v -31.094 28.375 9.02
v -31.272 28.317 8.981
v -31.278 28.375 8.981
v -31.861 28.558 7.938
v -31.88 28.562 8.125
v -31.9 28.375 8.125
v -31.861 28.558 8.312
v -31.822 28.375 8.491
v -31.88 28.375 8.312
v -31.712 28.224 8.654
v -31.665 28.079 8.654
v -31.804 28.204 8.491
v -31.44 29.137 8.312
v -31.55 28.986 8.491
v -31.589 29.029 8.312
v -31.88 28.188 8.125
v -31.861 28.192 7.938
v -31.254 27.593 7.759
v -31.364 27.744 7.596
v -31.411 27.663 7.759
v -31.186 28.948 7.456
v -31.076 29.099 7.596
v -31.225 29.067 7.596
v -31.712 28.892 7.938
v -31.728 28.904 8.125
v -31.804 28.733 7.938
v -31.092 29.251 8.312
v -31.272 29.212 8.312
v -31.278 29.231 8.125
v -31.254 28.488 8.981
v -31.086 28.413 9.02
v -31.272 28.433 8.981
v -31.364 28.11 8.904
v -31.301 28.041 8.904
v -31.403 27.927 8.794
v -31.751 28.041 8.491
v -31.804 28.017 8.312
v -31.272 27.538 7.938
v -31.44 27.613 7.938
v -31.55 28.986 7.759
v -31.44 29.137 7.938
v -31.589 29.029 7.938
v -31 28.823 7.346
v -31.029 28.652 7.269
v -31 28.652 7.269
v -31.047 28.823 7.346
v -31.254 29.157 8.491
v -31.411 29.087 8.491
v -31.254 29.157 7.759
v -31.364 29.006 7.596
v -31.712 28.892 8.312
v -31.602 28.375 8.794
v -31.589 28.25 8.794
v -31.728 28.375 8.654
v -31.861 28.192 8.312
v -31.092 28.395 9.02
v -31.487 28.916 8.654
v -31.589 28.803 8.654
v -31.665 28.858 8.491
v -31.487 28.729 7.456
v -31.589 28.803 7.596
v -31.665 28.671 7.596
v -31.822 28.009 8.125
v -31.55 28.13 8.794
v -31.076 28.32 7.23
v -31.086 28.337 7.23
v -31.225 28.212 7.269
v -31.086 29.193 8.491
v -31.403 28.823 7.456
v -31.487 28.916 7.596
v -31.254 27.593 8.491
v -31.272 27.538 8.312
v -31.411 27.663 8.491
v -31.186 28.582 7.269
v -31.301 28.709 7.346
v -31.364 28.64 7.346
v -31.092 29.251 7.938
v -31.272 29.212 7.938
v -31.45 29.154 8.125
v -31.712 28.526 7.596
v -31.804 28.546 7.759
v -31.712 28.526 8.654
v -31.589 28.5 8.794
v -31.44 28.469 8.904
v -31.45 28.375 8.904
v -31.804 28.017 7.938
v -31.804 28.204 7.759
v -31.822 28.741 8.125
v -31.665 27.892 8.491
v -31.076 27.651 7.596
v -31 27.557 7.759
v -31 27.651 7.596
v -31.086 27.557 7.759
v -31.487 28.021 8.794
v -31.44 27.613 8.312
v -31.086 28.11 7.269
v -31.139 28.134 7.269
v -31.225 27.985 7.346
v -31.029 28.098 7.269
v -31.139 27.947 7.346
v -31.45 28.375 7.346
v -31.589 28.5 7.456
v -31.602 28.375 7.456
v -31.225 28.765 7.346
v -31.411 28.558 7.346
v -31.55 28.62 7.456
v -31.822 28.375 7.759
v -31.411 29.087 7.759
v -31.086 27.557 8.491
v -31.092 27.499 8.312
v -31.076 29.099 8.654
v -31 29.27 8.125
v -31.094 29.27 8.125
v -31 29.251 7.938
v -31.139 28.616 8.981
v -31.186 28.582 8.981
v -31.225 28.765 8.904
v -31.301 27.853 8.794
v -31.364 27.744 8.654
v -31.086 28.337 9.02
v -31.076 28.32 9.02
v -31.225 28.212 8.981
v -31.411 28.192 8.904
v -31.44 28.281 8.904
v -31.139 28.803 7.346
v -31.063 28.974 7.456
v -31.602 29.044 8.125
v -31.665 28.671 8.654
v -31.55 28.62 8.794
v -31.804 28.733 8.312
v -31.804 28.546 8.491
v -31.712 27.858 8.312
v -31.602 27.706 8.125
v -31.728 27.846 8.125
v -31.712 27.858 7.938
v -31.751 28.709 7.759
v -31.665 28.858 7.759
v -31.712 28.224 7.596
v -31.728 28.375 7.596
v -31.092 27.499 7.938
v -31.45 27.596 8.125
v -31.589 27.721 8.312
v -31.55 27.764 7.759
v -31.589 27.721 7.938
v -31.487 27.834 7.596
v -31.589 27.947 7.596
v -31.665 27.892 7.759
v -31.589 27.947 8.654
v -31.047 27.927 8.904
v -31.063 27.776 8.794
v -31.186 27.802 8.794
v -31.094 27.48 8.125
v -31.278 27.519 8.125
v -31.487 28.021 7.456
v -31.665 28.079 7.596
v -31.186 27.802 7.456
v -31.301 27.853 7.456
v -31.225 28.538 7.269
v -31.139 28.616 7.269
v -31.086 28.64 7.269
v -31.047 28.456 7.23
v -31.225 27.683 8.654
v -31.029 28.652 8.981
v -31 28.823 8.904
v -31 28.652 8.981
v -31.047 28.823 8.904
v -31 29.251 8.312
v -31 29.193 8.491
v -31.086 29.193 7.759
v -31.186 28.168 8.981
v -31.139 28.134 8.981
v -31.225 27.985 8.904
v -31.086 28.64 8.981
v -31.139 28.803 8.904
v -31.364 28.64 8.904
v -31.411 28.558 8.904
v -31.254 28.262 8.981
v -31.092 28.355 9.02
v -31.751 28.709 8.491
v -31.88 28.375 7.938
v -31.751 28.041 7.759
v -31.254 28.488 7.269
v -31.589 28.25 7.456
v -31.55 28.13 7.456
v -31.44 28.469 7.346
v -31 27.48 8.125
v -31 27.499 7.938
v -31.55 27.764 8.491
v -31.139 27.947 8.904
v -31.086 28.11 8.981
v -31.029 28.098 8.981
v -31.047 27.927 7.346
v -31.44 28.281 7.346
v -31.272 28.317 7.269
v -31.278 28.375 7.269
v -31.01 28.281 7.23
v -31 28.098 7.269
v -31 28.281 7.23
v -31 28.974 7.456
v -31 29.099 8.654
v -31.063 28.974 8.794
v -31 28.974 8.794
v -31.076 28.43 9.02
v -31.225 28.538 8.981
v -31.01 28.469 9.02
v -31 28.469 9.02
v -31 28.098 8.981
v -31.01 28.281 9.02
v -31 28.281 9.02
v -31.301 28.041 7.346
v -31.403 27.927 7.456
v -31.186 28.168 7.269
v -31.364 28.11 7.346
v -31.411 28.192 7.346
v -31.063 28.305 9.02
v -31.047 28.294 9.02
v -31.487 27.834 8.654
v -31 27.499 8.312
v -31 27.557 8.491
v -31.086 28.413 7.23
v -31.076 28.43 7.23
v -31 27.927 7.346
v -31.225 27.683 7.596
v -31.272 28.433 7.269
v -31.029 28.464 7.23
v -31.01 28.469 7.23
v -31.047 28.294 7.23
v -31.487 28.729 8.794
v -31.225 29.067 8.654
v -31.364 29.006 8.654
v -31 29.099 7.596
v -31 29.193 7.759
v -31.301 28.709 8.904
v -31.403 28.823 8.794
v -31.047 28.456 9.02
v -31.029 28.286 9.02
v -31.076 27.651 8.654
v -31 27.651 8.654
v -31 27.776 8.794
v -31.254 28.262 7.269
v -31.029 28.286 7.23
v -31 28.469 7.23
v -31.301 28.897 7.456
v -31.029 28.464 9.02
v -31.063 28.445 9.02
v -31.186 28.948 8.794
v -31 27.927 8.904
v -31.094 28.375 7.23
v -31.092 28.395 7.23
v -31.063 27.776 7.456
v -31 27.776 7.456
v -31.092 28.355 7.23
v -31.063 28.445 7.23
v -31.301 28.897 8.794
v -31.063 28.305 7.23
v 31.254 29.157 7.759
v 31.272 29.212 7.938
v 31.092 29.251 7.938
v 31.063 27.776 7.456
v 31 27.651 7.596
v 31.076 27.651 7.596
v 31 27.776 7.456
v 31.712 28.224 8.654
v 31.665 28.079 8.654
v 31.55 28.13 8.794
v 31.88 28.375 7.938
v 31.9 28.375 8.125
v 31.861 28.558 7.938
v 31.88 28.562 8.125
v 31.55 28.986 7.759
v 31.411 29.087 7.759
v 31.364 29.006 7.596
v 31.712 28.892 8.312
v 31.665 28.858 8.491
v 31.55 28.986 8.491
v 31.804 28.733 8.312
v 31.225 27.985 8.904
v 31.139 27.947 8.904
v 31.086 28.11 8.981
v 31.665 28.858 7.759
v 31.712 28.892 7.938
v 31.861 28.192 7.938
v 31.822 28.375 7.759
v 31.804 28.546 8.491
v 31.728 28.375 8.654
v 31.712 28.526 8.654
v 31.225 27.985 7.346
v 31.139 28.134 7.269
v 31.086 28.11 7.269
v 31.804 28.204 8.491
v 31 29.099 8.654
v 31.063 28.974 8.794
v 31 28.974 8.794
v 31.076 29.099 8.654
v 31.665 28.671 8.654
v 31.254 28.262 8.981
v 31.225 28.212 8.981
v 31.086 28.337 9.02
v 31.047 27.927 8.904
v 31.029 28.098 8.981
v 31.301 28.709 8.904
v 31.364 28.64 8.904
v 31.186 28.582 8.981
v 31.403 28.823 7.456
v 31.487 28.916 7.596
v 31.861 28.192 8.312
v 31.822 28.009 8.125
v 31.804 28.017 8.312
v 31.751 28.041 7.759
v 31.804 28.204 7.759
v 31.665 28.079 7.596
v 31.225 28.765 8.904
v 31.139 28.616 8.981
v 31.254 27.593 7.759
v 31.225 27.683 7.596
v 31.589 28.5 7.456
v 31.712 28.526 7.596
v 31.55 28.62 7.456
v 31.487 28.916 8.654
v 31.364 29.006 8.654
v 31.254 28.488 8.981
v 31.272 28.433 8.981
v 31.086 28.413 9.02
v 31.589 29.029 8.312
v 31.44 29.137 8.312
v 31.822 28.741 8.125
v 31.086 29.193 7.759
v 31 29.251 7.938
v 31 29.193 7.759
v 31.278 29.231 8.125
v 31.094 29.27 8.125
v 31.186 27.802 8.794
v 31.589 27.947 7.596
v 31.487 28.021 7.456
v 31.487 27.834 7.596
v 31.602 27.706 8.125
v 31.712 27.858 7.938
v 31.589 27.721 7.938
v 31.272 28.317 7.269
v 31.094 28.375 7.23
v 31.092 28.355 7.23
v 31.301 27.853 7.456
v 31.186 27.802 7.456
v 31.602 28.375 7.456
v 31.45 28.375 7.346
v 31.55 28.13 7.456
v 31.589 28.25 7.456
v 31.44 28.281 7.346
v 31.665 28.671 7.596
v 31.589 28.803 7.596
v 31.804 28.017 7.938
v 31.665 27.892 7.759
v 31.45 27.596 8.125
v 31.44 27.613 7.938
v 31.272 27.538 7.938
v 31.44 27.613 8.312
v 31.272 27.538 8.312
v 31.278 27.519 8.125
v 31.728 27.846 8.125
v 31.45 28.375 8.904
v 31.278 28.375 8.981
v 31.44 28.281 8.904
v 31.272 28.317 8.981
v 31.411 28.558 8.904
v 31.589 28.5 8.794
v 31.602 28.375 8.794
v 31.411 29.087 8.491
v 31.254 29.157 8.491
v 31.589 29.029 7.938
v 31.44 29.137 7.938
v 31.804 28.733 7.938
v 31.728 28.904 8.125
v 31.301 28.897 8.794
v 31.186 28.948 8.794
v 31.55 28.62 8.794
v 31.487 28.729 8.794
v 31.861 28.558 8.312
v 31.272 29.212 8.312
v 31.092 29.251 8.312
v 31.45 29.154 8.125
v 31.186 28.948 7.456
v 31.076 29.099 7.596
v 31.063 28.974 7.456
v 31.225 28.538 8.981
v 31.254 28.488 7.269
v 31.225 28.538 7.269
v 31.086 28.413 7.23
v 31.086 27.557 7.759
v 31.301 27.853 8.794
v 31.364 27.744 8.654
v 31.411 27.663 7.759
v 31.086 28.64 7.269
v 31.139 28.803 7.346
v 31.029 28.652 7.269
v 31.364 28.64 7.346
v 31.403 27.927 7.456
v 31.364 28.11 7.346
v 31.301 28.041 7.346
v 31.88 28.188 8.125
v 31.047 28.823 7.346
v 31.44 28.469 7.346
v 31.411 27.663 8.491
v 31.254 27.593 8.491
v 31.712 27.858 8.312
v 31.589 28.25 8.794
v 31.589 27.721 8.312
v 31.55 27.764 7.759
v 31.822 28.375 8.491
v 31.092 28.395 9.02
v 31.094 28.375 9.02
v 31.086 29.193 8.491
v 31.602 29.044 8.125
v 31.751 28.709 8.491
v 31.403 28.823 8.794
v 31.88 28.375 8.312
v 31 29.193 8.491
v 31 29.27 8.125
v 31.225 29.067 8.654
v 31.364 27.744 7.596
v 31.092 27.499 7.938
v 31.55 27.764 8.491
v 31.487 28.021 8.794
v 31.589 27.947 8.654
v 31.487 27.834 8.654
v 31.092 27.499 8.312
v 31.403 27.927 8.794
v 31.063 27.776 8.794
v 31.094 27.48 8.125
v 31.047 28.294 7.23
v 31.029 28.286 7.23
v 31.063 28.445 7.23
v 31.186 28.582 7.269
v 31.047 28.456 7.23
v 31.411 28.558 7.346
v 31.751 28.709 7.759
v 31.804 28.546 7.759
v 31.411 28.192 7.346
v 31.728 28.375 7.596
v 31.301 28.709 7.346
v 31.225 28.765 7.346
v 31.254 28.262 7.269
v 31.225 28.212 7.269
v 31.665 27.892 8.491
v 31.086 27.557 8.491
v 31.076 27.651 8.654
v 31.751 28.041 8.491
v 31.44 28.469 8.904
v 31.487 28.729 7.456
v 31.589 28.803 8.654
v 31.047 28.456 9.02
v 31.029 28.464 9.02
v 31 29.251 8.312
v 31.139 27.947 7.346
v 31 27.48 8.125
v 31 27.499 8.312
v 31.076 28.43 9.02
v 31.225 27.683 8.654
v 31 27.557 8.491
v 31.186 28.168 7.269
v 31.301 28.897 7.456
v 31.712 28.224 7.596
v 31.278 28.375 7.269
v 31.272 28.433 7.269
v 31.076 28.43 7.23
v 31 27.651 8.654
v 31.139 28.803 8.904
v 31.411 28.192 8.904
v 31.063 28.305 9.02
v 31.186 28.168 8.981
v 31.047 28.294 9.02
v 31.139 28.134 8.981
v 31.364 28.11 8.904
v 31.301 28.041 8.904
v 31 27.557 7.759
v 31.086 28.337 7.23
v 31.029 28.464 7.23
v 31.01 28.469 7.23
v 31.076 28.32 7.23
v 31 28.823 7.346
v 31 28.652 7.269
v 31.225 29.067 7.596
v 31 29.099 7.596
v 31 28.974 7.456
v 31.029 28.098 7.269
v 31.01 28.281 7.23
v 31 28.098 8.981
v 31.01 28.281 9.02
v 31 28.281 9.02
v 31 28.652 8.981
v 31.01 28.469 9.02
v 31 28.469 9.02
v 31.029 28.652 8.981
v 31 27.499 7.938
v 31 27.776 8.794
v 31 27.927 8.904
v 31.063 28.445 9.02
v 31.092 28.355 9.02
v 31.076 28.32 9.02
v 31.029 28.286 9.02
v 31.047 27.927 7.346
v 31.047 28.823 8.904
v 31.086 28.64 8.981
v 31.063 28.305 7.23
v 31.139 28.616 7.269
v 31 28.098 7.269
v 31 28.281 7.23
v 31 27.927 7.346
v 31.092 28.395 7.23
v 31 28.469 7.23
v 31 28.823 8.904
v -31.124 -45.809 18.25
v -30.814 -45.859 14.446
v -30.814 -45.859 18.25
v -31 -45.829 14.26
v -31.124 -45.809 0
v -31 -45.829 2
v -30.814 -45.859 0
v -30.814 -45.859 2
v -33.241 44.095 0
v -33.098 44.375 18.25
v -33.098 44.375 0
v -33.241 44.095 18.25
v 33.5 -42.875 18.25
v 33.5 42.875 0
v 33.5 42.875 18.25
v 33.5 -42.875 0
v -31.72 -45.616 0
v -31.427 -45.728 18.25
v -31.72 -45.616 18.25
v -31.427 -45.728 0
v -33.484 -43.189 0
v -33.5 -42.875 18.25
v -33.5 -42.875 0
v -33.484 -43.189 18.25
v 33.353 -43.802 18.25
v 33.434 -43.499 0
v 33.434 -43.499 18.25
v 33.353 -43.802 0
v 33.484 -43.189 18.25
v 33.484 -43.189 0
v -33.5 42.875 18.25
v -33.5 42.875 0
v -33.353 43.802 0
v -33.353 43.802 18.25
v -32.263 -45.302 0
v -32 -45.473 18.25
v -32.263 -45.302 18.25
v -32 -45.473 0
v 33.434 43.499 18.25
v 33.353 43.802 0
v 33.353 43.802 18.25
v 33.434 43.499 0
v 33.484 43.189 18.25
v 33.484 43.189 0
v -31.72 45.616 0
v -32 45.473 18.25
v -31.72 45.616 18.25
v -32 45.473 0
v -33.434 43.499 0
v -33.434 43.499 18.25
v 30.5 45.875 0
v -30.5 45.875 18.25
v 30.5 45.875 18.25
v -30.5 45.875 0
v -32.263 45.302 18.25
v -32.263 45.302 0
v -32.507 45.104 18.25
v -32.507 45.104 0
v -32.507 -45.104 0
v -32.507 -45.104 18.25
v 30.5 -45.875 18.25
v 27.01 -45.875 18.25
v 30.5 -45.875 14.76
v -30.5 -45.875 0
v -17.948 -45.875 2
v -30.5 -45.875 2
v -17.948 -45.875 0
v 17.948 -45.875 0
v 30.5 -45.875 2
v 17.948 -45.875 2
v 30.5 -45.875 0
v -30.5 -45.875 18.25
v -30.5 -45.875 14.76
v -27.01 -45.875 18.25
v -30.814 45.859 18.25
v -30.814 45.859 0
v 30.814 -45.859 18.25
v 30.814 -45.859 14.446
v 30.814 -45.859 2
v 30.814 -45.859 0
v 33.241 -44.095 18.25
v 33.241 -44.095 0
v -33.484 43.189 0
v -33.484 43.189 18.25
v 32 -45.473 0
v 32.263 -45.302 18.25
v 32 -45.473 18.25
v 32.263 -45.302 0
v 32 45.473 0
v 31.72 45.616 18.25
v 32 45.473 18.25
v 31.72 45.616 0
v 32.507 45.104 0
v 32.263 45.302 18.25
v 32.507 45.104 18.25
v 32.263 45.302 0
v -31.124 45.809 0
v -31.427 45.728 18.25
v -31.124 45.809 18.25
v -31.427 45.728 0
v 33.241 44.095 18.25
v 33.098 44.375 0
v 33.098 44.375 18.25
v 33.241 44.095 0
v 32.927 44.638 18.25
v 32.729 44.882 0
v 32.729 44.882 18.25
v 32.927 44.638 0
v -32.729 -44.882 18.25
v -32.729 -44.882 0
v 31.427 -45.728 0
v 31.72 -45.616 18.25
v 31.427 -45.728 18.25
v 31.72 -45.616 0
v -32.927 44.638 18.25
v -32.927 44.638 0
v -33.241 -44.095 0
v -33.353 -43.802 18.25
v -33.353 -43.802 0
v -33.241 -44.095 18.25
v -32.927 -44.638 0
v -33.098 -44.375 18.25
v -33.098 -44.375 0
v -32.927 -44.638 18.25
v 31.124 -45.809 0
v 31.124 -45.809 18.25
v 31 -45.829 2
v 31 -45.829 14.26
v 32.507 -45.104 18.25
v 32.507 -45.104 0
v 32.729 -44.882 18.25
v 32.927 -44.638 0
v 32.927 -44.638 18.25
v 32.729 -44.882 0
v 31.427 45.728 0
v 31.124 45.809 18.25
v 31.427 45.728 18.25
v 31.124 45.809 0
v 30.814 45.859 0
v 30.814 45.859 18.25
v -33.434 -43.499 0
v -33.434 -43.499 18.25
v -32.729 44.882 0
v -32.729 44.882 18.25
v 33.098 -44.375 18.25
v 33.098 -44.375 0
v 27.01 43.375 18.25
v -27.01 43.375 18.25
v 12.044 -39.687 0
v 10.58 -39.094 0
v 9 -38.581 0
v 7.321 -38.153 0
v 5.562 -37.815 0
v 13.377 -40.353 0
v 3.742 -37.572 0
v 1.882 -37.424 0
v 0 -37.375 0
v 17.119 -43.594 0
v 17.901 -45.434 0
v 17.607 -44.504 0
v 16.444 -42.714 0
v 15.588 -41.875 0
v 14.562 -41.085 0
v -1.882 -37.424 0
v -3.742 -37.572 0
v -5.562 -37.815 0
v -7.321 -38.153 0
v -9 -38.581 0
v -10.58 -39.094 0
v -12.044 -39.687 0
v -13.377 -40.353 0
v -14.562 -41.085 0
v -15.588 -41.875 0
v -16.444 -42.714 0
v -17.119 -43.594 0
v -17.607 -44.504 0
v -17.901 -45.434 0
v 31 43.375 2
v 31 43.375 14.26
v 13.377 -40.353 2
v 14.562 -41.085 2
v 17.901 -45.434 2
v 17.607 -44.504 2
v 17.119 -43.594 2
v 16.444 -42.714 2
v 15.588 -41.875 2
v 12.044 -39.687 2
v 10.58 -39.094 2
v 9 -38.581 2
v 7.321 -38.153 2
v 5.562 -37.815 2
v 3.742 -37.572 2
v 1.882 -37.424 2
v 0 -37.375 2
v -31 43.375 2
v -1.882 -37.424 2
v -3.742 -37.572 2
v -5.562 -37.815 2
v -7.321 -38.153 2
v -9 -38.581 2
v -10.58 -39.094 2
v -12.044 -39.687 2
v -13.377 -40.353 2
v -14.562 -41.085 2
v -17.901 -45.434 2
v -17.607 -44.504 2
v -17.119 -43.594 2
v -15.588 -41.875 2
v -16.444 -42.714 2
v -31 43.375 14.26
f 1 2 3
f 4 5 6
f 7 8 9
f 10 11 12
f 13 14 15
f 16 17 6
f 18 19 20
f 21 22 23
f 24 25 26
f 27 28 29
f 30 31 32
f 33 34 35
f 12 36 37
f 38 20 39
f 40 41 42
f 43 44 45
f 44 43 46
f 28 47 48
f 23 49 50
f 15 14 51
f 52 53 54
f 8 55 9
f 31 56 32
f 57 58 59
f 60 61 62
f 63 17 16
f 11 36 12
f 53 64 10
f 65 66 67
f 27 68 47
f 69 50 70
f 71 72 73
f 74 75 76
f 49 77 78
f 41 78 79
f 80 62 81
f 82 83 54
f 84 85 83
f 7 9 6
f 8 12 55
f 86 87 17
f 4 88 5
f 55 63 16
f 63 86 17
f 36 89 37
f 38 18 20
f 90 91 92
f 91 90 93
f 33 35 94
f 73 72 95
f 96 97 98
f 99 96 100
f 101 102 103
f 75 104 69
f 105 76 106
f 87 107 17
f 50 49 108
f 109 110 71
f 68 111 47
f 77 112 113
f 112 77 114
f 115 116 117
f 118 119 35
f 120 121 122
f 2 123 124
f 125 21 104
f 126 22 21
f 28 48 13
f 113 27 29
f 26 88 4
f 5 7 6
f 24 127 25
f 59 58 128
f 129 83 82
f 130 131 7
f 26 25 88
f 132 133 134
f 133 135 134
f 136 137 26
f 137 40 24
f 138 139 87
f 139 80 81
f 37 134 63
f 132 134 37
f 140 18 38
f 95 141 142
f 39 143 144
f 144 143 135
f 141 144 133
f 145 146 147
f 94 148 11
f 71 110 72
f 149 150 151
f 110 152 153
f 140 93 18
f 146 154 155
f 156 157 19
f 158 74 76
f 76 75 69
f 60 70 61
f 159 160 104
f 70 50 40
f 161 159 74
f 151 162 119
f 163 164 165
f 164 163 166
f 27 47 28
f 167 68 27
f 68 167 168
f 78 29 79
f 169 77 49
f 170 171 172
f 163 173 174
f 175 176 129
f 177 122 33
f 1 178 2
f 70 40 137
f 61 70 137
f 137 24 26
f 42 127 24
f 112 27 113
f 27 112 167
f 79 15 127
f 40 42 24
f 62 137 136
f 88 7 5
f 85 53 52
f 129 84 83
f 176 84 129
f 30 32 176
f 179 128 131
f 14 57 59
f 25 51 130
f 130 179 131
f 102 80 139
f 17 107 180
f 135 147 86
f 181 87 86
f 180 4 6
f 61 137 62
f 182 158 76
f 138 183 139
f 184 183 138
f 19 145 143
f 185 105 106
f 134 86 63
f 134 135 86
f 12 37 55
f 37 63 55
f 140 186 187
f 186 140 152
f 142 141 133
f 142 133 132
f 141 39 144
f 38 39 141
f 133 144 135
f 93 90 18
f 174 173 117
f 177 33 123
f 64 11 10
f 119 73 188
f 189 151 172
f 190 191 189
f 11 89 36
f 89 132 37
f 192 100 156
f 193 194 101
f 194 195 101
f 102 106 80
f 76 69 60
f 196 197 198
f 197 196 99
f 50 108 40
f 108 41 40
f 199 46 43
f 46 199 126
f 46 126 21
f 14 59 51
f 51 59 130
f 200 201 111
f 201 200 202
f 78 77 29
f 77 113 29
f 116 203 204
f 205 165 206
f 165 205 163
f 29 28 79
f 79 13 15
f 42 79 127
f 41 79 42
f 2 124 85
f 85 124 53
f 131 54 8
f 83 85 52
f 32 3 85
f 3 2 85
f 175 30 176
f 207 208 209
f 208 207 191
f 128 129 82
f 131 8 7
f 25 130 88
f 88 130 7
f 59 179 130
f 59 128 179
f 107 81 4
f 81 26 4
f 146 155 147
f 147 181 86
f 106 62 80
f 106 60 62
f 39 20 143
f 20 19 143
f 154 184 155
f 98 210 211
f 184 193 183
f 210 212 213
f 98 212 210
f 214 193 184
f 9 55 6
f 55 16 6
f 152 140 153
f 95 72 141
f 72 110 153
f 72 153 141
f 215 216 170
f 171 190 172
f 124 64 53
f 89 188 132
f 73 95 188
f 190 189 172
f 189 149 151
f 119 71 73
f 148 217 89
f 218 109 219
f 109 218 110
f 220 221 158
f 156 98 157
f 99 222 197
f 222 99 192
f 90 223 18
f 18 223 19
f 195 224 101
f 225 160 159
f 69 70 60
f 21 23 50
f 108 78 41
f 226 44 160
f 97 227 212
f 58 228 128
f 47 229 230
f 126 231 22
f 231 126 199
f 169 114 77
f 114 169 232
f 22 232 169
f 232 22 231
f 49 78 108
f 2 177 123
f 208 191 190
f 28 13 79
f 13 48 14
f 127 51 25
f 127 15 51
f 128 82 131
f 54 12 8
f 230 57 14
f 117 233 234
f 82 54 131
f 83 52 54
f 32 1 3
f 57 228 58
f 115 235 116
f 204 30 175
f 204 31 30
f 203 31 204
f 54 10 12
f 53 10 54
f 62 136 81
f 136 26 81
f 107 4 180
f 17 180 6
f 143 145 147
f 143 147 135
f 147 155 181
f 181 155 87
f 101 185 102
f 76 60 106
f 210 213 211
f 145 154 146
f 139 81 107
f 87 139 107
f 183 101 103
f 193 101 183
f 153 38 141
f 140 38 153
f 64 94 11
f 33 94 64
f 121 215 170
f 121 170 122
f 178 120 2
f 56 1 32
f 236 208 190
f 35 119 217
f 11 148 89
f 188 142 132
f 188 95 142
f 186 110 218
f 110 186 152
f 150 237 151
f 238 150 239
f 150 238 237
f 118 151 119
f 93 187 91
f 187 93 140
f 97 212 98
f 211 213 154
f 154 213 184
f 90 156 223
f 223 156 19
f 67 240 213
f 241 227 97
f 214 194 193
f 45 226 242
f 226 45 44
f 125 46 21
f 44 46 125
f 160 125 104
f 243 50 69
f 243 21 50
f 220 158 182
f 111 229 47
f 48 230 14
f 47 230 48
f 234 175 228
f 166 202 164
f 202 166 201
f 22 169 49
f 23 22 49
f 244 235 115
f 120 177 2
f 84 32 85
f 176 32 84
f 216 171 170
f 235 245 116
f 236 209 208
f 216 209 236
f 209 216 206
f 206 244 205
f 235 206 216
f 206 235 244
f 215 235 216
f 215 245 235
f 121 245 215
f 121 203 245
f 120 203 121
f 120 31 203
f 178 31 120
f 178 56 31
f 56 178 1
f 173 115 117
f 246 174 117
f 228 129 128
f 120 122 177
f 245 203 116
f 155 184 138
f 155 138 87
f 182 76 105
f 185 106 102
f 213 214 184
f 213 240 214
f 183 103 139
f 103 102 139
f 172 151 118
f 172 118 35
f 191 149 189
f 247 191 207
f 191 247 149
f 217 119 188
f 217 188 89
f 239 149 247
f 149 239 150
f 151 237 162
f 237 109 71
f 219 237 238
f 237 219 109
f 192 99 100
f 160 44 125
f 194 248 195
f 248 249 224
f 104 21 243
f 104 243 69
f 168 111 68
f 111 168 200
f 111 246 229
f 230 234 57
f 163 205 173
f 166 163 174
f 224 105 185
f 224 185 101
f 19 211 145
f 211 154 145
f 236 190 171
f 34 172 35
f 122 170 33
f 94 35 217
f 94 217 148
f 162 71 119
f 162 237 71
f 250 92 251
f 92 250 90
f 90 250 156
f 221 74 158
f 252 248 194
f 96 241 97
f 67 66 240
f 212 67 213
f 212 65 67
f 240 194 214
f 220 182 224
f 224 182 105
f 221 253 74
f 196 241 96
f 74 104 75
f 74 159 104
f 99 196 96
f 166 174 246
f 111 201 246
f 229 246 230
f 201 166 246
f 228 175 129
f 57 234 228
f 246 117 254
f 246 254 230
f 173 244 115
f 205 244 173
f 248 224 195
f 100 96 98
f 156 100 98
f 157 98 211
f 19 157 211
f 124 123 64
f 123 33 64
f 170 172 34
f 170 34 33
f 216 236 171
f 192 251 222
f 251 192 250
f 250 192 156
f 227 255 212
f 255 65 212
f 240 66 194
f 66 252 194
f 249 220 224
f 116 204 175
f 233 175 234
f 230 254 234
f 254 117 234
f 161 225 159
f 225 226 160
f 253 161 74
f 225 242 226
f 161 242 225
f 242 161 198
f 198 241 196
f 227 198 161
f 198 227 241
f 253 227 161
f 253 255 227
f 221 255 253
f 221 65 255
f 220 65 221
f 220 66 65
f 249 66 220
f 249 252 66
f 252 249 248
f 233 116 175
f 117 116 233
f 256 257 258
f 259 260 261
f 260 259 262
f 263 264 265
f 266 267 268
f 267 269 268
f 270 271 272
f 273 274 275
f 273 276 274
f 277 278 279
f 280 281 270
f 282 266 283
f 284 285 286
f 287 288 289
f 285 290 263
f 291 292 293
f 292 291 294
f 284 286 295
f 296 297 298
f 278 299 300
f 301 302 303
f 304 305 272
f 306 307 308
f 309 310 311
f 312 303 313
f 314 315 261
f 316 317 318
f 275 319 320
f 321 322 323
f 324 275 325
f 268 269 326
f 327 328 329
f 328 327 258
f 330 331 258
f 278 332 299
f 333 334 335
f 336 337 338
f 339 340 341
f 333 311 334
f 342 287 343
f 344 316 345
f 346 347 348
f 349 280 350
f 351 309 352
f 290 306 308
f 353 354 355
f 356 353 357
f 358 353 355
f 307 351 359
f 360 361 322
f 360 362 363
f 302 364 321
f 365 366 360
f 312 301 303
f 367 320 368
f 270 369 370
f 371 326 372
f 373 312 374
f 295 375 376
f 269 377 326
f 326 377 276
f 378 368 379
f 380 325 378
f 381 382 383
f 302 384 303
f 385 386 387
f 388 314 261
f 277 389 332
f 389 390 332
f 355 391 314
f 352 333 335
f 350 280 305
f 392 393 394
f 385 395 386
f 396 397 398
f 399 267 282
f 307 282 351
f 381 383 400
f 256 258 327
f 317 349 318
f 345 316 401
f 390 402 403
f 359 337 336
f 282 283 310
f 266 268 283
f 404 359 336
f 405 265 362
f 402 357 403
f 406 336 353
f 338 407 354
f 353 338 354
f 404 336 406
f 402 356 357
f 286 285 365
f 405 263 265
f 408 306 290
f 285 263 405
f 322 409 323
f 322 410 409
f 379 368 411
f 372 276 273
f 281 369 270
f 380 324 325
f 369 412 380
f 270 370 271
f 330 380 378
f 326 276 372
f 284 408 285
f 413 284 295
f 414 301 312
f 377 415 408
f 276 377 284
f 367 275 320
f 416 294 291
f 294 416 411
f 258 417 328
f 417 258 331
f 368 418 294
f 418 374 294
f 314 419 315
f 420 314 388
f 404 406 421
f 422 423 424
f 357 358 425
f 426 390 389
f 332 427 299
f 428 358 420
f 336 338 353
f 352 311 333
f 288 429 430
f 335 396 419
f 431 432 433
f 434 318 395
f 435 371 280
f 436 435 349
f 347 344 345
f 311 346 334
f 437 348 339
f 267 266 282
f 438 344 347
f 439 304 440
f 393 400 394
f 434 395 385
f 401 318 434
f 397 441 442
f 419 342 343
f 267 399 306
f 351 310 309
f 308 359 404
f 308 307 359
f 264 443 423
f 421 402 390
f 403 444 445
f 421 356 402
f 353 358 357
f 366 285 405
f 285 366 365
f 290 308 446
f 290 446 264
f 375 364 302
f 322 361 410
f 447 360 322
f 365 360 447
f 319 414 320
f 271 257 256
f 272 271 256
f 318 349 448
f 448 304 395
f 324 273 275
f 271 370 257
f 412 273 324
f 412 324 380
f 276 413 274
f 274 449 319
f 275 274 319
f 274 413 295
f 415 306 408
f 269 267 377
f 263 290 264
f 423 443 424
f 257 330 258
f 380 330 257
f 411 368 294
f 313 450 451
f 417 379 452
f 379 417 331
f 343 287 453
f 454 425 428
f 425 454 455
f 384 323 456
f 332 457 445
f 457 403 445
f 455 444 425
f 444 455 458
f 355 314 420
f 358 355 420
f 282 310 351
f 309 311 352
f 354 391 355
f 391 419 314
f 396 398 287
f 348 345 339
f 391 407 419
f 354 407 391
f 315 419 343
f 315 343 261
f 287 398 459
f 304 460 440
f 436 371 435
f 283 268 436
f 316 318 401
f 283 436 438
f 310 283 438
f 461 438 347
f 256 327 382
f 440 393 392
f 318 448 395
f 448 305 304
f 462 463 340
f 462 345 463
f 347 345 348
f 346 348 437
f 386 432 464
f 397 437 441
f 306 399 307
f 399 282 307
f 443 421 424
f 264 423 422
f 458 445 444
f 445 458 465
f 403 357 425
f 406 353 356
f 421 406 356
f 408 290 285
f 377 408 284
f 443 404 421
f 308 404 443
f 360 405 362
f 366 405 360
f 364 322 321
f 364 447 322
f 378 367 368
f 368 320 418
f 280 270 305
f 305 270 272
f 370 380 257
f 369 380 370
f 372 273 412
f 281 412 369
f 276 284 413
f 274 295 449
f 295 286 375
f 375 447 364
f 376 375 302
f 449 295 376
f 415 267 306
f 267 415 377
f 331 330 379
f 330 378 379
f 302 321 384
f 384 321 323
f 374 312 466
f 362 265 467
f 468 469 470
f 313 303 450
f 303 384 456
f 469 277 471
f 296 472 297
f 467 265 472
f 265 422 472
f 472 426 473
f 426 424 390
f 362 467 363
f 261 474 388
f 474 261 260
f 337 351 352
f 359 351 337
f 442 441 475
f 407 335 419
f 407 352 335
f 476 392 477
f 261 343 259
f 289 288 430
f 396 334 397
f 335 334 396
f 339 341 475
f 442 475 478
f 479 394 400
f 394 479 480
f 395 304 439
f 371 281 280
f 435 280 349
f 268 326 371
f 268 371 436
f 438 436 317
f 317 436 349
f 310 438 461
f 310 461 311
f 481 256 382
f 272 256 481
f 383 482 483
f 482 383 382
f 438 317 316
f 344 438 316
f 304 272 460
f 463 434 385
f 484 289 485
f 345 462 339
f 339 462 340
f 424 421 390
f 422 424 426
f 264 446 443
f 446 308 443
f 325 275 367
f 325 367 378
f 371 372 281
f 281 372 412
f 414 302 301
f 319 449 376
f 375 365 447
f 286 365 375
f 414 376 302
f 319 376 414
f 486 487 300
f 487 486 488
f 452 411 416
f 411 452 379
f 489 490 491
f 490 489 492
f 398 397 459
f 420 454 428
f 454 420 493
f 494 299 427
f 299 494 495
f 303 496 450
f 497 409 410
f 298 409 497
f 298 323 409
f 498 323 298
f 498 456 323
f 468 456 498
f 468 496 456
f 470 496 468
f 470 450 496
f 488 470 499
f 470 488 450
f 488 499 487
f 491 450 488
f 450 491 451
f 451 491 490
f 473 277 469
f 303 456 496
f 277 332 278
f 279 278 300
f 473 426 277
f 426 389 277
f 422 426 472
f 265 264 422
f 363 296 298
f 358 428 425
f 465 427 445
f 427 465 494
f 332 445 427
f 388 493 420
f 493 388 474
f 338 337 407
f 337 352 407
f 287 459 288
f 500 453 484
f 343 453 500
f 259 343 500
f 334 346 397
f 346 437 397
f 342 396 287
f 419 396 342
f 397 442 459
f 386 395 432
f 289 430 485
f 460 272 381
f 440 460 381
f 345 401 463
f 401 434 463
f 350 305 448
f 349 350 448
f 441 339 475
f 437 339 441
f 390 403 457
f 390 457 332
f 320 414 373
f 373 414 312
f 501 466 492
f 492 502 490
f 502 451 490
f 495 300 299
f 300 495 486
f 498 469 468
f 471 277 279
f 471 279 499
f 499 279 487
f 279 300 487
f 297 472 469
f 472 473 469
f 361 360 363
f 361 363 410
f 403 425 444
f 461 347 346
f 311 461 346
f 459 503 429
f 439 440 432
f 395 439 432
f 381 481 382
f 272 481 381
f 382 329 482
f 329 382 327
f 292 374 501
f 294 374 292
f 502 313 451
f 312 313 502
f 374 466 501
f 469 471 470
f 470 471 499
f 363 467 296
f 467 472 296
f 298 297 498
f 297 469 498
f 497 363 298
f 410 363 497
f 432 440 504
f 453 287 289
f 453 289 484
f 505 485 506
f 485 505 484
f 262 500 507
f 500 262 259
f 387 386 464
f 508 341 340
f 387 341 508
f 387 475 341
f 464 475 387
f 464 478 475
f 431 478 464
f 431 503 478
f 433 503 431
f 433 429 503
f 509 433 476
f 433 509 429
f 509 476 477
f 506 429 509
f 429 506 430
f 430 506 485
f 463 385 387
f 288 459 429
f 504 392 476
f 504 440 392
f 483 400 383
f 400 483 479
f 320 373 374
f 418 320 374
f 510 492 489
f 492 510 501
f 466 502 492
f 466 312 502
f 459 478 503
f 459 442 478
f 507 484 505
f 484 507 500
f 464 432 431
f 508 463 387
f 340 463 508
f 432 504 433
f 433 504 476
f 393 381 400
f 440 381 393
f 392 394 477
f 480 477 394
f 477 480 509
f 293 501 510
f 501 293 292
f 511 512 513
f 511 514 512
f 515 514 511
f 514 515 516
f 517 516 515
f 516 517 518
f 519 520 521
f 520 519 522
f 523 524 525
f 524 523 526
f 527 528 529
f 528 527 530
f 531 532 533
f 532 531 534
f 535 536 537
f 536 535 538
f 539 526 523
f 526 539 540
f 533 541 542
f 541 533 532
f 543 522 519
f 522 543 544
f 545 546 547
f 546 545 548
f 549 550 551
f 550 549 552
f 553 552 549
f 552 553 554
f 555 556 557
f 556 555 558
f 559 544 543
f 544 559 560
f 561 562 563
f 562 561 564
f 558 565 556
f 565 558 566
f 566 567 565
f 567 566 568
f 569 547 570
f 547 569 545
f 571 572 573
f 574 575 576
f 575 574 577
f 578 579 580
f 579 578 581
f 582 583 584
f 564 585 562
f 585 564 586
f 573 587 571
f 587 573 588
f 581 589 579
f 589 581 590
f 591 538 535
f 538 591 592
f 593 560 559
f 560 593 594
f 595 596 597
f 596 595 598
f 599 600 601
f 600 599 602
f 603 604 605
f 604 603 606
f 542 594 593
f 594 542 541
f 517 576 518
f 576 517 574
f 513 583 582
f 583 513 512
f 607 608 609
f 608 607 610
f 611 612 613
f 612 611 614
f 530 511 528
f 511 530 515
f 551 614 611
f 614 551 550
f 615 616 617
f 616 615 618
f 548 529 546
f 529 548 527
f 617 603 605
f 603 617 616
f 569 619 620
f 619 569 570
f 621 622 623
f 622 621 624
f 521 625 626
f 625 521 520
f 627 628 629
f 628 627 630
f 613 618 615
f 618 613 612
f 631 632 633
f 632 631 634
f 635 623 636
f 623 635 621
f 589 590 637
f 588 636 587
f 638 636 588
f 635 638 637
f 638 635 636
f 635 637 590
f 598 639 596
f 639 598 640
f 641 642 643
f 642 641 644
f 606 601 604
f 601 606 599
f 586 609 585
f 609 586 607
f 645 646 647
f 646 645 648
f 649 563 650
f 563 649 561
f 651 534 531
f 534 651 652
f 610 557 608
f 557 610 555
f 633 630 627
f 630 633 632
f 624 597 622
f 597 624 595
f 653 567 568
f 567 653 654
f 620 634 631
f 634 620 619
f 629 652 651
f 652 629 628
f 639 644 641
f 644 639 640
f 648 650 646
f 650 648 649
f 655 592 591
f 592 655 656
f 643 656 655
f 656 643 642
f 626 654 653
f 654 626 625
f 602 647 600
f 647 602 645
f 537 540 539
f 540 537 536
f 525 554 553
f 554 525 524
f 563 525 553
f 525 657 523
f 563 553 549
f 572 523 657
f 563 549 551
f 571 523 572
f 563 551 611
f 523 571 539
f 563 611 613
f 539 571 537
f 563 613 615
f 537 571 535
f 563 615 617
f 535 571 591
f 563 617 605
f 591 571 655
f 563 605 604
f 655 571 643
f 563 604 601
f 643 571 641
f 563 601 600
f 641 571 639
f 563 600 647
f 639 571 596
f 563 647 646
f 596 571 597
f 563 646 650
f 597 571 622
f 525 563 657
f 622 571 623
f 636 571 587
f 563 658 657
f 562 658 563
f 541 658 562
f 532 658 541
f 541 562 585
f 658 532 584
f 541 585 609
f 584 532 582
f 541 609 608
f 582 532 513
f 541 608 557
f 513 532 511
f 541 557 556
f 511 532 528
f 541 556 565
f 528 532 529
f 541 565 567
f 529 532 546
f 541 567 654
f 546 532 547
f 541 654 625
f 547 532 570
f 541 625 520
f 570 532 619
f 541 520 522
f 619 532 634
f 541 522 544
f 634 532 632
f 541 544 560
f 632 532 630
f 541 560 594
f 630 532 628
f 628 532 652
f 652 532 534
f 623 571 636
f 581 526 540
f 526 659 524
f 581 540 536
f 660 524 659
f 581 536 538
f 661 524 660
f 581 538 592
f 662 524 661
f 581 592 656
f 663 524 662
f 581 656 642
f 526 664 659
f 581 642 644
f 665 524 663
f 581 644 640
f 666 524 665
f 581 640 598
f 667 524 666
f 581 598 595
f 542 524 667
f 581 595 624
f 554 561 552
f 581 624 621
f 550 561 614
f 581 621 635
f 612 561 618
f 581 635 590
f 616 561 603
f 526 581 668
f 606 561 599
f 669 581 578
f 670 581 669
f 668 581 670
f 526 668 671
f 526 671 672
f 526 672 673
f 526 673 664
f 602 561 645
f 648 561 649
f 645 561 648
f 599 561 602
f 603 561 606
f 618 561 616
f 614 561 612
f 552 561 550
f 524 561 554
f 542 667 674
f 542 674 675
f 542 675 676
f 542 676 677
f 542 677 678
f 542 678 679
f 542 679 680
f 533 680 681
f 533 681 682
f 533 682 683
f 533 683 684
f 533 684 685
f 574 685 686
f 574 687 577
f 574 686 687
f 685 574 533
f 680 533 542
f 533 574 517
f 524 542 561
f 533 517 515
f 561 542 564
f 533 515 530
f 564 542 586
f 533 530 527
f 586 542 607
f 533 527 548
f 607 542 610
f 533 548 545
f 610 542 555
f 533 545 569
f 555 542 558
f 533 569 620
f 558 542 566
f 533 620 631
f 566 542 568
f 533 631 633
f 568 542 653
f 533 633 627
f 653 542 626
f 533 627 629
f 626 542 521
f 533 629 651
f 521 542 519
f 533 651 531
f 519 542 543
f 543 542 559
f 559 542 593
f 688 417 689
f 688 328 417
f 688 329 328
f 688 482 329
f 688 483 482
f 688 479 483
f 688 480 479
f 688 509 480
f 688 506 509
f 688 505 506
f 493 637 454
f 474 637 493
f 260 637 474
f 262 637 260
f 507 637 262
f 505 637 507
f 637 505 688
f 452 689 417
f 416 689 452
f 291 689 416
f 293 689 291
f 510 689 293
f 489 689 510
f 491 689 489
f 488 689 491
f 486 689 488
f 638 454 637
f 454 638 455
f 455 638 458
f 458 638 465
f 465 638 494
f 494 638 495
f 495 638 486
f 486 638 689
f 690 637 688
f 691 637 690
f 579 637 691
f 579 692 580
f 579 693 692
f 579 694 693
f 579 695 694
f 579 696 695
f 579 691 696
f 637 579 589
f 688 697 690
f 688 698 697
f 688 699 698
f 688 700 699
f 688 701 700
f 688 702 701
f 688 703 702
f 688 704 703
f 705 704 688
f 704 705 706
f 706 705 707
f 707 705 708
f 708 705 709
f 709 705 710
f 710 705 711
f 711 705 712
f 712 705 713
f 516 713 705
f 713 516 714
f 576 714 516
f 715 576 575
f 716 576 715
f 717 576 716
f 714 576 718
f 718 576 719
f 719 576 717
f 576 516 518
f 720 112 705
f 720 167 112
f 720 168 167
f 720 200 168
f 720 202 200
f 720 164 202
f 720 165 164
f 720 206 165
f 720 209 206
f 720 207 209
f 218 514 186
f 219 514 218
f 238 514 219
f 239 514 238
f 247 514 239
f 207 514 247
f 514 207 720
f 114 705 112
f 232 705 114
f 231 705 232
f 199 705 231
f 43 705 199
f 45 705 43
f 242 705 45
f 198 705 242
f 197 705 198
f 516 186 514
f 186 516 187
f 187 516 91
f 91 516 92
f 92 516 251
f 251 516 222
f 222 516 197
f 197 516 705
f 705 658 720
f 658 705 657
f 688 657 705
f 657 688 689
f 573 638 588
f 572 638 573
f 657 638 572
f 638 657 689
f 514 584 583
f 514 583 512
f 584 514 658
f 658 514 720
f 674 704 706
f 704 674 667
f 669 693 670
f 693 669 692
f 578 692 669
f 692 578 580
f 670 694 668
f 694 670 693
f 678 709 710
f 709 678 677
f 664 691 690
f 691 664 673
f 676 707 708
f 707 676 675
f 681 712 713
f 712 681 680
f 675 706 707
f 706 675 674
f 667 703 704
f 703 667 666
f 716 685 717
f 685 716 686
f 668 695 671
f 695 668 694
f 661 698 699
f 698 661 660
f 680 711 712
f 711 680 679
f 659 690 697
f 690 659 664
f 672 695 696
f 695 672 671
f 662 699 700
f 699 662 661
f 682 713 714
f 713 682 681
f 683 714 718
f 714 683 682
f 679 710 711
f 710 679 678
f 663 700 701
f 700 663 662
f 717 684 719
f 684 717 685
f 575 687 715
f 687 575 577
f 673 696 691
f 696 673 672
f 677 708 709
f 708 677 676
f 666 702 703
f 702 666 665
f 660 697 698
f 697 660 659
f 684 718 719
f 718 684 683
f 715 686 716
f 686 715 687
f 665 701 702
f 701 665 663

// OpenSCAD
$fn = 60;

//
// Parameters
//

// Base dimension parameters (Inner card stack)
card_width = 56.5;
card_length = 86.5;
stack_height = 6.0;

// Shell structural parameters
wall_thickness = 2.5;
bottom_thickness = 2.0;
outer_radius = 3.0;
lip_height = 4.0;

// Fitment and tolerances
sliding_tolerance = 0.25;      // Clearance for a smooth sliding fit
snap_radius = 0.9;             // Radius of the snap-fit indents
snap_y_offset = 15.0;          // Y-axis distance from the back for snap-fit spheres
thumb_cutout_radius = 18.0;    // Radius for the thumb access cutout

// Calculated base part dimensions
base_x = card_width + 2 * wall_thickness;
base_y = card_length + wall_thickness;
base_z = bottom_thickness + stack_height + lip_height;

// Calculated inner shell dimensions (base + tolerance)
inner_x = base_x + 2 * sliding_tolerance;
inner_y = base_y + sliding_tolerance;
inner_z = base_z + sliding_tolerance;

// Calculated total outer shell dimensions
total_x = inner_x + 2 * wall_thickness;
total_y = inner_y + wall_thickness;
total_z = bottom_thickness + inner_z + lip_height;

//
// Helper modules
//

// Generates a rectangular solid with rounded corners in the XY plane
module rounded_cuboid(x_size, y_size, z_size, radius) {
    hull() {
        for (i = [0, 1]) {
            for (j = [0, 1]) {
                translate([
                    i * (x_size - 2 * radius) + radius, 
                    j * (y_size - 2 * radius) + radius, 
                    0
                ]) 
                cylinder(h = z_size, r = radius);
            }
        }
    }
}

//
// Main geometry
//

module outer_shell() {
    difference() {
        // 1. Main outer body
        rounded_cuboid(total_x, total_y, total_z, outer_radius);
        
        // 2. Inner void for the bottom part
        translate([wall_thickness, -1, bottom_thickness])
            cube([inner_x, inner_y + 1, inner_z]);
            
        // 3. Internal 45-degree chamfer for support-free roof printing
        translate([wall_thickness, -1, bottom_thickness + inner_z])
            hull() {
                cube([inner_x, inner_y + 1, 0.01]);
                translate([lip_height, 0, lip_height])
                    cube([inner_x - 2 * lip_height, inner_y + 1, 0.01]);
            }
            
        // 4. Elliptical thumb access cutout
        translate([total_x / 2, -0.5, bottom_thickness + inner_z / 2])
            scale([1, 0.5, 1]) 
            cylinder(h = total_z + 5, r = thumb_cutout_radius, center = true);
            
        // 5. Integrated snap-fit recesses (negatives for bottom part detents)
        for (x_pos = [wall_thickness, total_x - wall_thickness]) {
            translate([x_pos, inner_y - snap_y_offset, bottom_thickness + inner_z / 2]) 
                sphere(r = snap_radius, $fn = 30);
        }
    }
}

//
// Final assembly
//

// Center the part on the build plate for standard FDM printing
translate([-total_x / 2, -total_y / 2, 0])
    outer_shell();
